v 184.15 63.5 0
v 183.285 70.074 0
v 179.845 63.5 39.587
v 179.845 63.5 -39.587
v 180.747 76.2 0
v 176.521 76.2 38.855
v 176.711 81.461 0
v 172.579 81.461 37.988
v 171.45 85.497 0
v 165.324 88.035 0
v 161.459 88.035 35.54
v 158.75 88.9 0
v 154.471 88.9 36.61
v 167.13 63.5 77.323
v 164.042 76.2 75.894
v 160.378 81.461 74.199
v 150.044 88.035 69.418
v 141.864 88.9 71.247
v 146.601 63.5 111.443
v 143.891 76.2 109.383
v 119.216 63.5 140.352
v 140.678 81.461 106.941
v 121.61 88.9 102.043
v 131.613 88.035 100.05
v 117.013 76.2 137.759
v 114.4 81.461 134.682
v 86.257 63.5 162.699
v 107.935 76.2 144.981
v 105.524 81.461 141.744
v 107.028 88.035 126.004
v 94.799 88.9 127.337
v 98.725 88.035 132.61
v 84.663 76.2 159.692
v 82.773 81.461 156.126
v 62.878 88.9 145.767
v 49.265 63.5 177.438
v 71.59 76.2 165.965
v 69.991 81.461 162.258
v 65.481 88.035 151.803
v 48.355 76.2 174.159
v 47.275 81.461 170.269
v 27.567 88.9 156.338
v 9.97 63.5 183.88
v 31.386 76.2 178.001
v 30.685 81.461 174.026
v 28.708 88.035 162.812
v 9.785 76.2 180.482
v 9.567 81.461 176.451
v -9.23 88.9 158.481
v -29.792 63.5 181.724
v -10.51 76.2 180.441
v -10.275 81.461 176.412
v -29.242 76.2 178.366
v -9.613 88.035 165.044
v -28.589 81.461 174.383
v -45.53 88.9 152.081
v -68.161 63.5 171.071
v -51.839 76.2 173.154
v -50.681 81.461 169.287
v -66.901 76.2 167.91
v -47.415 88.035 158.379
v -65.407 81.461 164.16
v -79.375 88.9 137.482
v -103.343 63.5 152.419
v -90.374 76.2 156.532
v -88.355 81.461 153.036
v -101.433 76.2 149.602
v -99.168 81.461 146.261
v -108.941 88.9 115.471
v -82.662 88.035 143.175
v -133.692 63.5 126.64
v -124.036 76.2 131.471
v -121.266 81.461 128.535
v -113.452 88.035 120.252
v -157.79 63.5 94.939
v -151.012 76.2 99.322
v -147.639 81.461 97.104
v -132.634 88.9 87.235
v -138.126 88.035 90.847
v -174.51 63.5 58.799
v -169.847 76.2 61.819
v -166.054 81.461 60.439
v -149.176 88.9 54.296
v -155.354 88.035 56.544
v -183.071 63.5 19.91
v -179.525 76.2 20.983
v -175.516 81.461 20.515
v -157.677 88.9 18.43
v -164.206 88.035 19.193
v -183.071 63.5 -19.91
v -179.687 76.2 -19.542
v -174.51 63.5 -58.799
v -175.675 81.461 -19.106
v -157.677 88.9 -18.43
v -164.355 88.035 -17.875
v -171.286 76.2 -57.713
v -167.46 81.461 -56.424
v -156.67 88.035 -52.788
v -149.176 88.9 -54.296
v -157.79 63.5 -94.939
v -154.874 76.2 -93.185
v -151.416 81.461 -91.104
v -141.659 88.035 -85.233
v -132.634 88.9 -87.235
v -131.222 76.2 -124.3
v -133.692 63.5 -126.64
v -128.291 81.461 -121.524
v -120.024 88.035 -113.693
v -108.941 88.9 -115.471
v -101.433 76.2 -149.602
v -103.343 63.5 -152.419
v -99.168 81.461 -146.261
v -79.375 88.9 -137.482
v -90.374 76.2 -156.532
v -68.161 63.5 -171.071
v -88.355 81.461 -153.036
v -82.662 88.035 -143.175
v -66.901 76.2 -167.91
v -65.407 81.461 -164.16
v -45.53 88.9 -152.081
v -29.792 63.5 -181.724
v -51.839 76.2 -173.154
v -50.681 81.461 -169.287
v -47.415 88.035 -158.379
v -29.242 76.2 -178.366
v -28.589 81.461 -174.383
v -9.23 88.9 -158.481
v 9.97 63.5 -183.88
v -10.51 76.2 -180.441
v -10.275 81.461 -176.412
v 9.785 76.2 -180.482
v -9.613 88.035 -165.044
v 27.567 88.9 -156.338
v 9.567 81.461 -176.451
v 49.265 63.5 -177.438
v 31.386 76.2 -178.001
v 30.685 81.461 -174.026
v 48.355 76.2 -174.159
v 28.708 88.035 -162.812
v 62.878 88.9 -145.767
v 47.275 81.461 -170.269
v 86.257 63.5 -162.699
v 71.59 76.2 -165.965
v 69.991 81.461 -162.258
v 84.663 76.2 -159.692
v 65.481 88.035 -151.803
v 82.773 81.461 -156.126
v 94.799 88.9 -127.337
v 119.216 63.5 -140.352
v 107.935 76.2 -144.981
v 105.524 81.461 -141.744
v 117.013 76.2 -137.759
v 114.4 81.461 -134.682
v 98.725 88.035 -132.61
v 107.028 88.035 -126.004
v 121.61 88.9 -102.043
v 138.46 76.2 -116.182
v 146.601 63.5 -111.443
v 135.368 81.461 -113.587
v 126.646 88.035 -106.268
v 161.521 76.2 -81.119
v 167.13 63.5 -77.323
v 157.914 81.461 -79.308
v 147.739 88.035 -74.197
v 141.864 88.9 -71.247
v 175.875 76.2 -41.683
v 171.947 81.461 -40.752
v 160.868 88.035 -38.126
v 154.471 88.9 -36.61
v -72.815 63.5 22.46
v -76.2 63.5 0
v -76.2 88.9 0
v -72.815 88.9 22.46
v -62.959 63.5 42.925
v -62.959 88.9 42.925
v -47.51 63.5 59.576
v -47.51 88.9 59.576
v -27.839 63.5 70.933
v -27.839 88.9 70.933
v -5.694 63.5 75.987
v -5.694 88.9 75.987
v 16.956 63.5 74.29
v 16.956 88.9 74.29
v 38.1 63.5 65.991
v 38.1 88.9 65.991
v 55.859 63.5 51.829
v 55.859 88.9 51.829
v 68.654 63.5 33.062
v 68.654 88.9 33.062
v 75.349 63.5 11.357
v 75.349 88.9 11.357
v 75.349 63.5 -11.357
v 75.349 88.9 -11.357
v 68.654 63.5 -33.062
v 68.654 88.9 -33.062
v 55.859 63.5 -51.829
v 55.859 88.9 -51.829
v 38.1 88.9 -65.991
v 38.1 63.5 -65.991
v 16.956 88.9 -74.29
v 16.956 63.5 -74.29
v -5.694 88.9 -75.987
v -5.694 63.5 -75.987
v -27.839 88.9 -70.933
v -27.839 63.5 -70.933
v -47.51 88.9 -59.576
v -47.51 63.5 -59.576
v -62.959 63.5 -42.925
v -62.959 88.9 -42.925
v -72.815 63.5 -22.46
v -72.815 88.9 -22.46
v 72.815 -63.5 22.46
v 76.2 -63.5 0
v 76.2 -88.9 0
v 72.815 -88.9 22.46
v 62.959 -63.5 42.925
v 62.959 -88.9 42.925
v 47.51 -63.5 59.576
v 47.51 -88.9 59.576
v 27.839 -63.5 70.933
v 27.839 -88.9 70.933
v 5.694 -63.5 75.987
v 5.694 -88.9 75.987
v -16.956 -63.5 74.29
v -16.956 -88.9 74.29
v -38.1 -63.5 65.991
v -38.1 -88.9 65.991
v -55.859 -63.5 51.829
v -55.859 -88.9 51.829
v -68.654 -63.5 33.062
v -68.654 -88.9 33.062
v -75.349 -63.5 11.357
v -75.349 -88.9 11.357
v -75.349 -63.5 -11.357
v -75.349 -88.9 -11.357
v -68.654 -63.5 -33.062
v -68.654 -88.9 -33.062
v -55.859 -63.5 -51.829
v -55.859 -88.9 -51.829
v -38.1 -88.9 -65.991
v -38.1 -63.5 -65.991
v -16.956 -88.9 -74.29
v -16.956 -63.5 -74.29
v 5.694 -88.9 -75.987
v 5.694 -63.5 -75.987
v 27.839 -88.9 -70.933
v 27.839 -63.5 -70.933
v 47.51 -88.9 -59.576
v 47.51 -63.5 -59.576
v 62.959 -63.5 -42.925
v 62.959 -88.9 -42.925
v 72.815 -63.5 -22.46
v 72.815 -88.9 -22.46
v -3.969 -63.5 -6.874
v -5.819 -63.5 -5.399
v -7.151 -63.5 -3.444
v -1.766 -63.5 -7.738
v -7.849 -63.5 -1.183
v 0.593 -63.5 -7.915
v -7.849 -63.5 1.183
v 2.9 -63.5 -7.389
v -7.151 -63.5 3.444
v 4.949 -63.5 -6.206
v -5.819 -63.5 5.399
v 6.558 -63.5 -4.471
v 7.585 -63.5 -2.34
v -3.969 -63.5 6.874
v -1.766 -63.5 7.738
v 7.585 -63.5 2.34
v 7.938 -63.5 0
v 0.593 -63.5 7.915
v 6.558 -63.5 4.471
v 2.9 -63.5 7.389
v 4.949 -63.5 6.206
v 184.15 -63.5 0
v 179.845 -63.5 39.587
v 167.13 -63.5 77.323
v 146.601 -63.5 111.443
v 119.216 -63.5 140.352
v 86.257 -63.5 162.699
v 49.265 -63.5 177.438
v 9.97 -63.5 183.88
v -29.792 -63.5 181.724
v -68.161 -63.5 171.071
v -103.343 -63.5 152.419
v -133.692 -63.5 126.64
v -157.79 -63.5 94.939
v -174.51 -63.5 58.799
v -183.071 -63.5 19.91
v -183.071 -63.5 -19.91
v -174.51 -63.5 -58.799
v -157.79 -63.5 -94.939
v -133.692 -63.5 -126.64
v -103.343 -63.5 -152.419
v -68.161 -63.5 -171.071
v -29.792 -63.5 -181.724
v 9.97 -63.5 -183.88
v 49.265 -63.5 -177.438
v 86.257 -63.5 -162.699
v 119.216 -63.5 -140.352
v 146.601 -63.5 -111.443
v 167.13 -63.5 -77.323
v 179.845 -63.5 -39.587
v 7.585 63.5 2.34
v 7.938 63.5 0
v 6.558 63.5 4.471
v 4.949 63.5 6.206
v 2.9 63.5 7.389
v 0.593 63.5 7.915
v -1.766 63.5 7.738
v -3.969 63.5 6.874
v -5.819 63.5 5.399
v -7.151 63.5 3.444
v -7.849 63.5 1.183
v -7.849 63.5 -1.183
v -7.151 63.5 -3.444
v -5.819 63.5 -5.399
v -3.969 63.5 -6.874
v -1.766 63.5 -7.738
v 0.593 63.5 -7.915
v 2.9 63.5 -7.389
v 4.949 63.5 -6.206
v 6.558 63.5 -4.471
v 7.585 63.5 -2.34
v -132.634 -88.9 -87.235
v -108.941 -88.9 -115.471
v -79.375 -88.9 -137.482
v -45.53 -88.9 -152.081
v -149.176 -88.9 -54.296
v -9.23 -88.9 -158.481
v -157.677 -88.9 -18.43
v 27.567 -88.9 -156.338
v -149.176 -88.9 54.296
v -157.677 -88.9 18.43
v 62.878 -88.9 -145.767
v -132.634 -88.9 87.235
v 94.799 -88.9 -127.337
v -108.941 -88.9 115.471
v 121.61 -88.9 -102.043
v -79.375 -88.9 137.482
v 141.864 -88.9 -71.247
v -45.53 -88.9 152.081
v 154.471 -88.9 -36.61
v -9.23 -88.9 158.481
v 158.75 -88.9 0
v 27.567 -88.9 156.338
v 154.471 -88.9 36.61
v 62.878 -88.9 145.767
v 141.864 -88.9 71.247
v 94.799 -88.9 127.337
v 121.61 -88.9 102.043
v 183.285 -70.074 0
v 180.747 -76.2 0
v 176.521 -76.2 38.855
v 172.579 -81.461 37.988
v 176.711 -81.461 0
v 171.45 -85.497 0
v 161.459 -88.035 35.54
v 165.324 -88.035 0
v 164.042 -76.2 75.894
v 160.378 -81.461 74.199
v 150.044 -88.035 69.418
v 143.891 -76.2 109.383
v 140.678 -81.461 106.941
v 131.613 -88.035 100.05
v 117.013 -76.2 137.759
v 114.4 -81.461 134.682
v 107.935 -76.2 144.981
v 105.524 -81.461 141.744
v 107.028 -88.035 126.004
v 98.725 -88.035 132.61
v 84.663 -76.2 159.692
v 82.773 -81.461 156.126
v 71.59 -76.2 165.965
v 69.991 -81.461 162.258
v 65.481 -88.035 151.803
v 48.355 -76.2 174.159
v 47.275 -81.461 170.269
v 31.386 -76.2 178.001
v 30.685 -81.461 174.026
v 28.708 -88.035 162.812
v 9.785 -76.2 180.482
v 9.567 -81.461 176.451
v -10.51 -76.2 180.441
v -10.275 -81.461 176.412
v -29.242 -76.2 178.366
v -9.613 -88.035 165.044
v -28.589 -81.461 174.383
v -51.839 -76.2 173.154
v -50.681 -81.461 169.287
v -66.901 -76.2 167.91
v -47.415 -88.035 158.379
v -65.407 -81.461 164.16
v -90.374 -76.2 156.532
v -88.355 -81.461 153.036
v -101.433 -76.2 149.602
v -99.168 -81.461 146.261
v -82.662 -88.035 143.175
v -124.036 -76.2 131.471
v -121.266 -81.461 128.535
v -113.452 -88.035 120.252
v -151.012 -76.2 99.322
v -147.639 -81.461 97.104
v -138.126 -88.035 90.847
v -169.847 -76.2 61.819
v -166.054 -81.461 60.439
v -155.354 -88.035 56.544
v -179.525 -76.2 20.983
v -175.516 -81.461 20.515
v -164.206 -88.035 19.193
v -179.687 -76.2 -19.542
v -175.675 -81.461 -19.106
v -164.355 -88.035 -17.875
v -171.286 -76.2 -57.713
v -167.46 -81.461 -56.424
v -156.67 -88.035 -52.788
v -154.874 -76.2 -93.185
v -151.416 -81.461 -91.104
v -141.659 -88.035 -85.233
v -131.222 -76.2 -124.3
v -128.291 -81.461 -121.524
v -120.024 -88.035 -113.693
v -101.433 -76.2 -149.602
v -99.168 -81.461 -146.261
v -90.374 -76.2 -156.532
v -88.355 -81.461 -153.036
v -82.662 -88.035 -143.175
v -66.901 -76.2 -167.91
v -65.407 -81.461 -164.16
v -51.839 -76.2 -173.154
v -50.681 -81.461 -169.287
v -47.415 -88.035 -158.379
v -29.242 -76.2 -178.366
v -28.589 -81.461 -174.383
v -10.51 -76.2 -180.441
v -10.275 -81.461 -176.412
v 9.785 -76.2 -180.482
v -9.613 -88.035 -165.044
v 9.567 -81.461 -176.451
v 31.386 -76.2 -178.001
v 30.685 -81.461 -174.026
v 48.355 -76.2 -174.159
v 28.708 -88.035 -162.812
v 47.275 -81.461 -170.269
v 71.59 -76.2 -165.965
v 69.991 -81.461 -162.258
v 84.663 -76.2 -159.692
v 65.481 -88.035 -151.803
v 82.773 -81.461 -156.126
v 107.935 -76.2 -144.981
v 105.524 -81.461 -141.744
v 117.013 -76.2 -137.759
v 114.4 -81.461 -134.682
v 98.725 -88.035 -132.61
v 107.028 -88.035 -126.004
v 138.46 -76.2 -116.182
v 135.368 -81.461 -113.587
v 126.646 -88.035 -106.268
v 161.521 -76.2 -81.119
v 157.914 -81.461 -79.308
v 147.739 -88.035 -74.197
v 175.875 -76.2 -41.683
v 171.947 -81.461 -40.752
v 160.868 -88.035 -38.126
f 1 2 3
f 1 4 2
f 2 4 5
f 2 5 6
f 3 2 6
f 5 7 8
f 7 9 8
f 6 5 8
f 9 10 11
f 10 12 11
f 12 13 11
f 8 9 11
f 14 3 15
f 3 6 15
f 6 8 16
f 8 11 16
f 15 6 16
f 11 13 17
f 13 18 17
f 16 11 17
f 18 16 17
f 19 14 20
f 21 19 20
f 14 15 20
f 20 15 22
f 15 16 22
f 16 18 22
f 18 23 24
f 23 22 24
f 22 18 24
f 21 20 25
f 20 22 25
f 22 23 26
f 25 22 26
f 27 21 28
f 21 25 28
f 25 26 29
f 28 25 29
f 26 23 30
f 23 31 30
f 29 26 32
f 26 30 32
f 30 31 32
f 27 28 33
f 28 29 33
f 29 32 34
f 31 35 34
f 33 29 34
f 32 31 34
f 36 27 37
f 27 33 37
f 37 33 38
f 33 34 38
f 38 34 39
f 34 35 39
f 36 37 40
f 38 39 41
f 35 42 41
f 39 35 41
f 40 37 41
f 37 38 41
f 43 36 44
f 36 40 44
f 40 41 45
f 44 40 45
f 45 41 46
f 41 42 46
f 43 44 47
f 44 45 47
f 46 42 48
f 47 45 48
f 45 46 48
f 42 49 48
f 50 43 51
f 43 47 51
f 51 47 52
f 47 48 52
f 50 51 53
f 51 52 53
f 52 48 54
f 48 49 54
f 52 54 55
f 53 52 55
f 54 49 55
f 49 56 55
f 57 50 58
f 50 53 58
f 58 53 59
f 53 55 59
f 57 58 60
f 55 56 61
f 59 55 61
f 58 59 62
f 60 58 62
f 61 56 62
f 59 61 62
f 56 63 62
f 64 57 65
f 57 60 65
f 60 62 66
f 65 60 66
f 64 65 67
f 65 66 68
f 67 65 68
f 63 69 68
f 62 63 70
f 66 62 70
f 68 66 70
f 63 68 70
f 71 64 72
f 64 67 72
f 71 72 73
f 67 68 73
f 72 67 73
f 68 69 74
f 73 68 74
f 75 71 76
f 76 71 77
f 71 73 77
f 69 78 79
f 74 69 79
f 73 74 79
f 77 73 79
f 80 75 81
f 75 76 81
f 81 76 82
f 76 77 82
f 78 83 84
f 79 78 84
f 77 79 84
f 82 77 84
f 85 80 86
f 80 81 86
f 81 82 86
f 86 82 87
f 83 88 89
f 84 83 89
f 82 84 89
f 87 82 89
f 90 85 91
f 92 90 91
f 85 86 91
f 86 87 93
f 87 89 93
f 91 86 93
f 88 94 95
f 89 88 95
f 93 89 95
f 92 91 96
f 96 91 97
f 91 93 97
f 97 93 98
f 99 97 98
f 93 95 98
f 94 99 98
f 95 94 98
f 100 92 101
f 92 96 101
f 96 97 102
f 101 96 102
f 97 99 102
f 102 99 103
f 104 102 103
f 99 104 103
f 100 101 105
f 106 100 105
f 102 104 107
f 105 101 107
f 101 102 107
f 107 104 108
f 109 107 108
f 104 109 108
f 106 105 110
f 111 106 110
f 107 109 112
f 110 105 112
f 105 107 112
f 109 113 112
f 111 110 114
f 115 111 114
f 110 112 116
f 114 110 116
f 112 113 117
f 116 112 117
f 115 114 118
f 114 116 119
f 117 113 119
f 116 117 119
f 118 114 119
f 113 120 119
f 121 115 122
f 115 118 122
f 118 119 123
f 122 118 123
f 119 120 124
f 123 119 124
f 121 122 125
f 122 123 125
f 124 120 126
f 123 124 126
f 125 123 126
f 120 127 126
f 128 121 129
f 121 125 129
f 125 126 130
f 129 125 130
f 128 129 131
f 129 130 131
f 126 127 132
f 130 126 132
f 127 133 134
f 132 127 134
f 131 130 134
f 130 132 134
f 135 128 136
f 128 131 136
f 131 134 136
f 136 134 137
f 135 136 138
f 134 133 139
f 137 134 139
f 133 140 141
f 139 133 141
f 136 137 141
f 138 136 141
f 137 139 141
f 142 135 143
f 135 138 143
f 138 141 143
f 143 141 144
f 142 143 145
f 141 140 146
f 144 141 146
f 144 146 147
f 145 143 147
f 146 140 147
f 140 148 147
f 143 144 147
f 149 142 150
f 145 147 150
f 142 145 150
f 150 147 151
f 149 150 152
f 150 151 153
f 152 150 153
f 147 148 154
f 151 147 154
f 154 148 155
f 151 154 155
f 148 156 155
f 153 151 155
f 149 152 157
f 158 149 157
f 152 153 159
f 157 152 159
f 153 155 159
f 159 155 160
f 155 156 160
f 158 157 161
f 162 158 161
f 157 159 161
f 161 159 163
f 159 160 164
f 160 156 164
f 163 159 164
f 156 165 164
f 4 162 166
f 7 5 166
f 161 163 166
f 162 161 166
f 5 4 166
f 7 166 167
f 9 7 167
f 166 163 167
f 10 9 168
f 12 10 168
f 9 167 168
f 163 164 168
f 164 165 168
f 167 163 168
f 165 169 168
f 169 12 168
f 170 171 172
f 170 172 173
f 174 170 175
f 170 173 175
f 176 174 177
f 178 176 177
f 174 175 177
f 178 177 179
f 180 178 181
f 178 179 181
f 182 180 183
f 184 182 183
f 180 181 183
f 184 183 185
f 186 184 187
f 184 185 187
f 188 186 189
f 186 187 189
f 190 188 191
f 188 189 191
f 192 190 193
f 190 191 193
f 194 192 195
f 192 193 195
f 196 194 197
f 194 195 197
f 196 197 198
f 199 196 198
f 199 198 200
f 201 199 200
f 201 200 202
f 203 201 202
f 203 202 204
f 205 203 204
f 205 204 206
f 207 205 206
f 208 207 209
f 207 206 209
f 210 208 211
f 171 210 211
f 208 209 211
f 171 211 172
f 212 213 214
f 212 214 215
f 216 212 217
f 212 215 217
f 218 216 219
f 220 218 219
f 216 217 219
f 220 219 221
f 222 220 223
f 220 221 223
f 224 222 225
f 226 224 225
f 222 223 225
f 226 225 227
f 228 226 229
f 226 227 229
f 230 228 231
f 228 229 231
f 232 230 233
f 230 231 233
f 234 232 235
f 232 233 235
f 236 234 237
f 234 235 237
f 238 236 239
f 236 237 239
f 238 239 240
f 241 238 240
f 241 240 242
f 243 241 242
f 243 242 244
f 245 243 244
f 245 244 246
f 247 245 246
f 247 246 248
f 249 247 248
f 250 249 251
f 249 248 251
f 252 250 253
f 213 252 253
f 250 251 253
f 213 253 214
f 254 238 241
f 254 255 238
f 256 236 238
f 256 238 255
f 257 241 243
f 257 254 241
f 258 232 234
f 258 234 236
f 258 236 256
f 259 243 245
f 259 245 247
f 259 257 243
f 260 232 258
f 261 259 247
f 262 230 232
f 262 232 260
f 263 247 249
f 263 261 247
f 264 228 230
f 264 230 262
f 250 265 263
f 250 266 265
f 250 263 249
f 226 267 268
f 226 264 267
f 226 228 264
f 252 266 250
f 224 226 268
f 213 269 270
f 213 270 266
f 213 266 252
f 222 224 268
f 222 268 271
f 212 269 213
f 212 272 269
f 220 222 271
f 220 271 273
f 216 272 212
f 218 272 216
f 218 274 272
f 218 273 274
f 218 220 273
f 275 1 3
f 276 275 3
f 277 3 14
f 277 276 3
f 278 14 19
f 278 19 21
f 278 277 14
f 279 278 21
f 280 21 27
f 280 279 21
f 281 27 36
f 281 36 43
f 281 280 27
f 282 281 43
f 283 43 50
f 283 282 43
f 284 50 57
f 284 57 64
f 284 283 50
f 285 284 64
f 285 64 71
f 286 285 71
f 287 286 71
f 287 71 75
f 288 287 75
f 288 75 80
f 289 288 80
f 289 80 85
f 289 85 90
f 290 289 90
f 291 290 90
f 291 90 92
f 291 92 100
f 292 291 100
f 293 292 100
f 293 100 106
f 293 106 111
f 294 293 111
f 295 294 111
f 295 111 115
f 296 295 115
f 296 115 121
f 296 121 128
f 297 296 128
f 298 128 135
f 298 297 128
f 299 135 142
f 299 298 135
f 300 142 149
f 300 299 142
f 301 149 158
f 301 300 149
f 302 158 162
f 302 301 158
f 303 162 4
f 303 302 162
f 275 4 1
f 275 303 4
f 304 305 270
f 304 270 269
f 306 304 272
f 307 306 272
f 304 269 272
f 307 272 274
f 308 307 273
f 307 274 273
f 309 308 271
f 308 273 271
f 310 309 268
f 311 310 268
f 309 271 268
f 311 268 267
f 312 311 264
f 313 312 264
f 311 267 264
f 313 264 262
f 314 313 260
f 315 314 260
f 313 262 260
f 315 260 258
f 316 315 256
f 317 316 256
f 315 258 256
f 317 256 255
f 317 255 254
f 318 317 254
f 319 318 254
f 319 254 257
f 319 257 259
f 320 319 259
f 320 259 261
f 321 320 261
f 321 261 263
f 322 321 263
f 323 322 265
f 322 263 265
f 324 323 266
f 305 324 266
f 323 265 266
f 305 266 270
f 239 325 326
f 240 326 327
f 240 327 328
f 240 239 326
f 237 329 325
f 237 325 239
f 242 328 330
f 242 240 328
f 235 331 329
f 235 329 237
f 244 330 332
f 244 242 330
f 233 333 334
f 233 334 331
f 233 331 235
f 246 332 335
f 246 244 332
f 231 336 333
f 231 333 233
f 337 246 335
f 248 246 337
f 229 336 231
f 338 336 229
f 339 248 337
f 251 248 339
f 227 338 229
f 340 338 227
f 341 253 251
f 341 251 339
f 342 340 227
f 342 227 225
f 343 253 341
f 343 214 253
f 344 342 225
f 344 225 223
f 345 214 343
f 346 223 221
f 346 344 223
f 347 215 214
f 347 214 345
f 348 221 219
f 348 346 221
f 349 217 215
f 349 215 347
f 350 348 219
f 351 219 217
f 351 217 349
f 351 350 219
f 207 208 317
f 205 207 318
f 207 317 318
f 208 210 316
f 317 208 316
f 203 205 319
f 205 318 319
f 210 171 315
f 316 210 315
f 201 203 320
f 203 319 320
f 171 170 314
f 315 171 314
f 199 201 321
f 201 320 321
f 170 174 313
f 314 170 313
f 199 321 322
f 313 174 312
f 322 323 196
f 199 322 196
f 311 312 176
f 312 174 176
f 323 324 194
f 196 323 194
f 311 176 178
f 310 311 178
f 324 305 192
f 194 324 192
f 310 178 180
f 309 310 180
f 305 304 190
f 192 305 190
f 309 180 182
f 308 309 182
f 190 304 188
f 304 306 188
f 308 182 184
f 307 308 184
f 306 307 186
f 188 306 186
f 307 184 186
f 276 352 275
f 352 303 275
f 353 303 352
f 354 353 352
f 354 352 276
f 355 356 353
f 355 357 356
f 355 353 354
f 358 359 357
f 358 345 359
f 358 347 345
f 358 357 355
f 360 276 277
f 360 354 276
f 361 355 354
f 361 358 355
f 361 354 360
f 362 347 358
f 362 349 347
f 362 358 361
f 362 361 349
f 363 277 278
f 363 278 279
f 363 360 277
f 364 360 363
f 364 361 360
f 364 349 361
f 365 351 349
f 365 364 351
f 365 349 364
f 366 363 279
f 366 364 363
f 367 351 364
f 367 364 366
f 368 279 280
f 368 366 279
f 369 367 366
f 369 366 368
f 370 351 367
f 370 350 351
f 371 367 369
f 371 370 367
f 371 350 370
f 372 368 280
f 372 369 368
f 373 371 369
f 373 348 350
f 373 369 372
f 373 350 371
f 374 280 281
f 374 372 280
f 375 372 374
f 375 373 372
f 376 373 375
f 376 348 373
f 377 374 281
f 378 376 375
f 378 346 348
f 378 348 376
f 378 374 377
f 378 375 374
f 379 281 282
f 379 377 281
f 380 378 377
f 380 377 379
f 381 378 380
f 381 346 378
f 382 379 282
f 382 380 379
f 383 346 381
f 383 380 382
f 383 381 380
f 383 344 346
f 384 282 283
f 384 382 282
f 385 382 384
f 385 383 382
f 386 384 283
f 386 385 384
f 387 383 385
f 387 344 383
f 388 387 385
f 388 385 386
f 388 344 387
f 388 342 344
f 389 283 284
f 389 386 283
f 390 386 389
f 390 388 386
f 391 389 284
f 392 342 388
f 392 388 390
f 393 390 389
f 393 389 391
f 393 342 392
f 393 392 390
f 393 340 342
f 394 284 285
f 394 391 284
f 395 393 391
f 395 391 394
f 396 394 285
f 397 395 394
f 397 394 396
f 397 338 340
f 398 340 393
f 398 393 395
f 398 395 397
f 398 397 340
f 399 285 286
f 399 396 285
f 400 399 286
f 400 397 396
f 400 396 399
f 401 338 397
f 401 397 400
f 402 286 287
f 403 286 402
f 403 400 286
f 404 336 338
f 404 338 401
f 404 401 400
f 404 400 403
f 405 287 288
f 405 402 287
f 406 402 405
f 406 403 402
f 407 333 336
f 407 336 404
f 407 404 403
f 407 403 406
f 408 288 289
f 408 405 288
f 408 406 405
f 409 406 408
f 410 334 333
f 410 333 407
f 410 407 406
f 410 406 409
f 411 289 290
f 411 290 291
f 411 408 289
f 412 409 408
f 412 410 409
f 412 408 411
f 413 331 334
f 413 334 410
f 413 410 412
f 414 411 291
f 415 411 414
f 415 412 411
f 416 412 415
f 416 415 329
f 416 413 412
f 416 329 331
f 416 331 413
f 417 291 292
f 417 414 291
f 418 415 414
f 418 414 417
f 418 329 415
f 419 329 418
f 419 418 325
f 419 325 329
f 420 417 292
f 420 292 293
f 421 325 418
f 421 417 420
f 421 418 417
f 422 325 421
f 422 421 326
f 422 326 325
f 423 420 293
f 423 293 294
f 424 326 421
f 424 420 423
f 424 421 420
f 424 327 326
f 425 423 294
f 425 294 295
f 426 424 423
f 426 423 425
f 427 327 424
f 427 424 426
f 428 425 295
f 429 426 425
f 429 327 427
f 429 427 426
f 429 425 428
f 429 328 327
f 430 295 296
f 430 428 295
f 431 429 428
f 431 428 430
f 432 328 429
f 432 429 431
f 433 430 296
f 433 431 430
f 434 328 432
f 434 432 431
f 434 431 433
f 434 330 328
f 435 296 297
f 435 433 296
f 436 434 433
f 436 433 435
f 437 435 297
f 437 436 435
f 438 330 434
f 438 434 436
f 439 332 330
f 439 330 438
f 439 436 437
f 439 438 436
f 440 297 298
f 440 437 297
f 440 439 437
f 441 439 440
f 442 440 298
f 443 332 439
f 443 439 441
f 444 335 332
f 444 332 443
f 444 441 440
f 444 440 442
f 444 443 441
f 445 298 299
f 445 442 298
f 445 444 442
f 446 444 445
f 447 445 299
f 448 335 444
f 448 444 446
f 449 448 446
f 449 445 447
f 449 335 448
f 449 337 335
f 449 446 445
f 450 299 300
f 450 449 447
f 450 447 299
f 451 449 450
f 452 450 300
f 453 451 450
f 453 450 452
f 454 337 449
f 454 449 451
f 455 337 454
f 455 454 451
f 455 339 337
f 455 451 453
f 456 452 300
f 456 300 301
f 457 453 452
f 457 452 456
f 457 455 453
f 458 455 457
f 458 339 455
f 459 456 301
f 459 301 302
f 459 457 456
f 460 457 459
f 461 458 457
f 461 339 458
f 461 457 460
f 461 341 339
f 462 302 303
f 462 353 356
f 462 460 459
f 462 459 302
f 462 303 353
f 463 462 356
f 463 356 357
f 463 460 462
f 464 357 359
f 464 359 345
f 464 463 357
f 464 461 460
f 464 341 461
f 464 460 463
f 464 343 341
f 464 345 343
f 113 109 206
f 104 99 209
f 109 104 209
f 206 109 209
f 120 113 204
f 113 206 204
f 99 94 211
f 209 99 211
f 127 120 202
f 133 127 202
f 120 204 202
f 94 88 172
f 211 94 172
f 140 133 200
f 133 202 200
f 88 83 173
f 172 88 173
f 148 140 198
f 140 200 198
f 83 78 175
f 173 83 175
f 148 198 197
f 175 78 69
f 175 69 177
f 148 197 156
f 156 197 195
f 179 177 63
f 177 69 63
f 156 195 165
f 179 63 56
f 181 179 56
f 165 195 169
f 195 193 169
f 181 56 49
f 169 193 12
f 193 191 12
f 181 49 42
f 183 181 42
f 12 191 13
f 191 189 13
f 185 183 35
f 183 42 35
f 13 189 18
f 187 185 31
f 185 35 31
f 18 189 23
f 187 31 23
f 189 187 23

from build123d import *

# Parameters (mm, degrees)
F0_R      = 184.15
F1_DEPTH  = 88.9
F2_R      = 76.2
F3_DEPTH  = 25.4
F4_R      = 76.2
F5_DEPTH  = 25.4
F6_R      = 12.7
F7_DEPTH  = 177.8
F8_R      = 25.4
F9_R      = 12.7
F9_R_2    = 7.9375
F10_DEPTH = 127


with BuildPart() as f1:
    # F0 (on Front) → F1 (new body, symmetric)
    with BuildSketch(Plane.XZ):
        Circle(F0_R)
    extrude(amount=F1_DEPTH, both=True)

    # F2 (on face) → F3 (cut)
    with BuildSketch(Plane.XZ.offset(88.9)):
        Circle(F2_R)
    extrude(amount=-F3_DEPTH, mode=Mode.SUBTRACT)

    # F4 (on face) → F5 (cut)
    with BuildSketch(Plane(origin=(0, 88.9, 0), x_dir=(-1, 0, 0), z_dir=(0, 1, 0))):
        Circle(F4_R)
    extrude(amount=-F5_DEPTH, mode=Mode.SUBTRACT)

    # F6 (on face) → F7 (cut, symmetric)
    with BuildSketch(Plane.XZ.offset(88.9)):
        Circle(F6_R)
    extrude(amount=F7_DEPTH, both=True, mode=Mode.SUBTRACT)

    # F8
    f8_edges = [f1.edges().sort_by_distance(p)[0] for p in [
        (-184.15, 88.9, 0),
        (-184.15, -88.9, 0),
    ]]
    fillet(f8_edges, radius=F8_R)

    # F9 (on face) → F10 (join)
    with BuildSketch(Plane.XZ.offset(63.5)):
        Circle(F9_R)
        Circle(F9_R_2, mode=Mode.SUBTRACT)
    extrude(amount=-F10_DEPTH)


solid = f1.part
